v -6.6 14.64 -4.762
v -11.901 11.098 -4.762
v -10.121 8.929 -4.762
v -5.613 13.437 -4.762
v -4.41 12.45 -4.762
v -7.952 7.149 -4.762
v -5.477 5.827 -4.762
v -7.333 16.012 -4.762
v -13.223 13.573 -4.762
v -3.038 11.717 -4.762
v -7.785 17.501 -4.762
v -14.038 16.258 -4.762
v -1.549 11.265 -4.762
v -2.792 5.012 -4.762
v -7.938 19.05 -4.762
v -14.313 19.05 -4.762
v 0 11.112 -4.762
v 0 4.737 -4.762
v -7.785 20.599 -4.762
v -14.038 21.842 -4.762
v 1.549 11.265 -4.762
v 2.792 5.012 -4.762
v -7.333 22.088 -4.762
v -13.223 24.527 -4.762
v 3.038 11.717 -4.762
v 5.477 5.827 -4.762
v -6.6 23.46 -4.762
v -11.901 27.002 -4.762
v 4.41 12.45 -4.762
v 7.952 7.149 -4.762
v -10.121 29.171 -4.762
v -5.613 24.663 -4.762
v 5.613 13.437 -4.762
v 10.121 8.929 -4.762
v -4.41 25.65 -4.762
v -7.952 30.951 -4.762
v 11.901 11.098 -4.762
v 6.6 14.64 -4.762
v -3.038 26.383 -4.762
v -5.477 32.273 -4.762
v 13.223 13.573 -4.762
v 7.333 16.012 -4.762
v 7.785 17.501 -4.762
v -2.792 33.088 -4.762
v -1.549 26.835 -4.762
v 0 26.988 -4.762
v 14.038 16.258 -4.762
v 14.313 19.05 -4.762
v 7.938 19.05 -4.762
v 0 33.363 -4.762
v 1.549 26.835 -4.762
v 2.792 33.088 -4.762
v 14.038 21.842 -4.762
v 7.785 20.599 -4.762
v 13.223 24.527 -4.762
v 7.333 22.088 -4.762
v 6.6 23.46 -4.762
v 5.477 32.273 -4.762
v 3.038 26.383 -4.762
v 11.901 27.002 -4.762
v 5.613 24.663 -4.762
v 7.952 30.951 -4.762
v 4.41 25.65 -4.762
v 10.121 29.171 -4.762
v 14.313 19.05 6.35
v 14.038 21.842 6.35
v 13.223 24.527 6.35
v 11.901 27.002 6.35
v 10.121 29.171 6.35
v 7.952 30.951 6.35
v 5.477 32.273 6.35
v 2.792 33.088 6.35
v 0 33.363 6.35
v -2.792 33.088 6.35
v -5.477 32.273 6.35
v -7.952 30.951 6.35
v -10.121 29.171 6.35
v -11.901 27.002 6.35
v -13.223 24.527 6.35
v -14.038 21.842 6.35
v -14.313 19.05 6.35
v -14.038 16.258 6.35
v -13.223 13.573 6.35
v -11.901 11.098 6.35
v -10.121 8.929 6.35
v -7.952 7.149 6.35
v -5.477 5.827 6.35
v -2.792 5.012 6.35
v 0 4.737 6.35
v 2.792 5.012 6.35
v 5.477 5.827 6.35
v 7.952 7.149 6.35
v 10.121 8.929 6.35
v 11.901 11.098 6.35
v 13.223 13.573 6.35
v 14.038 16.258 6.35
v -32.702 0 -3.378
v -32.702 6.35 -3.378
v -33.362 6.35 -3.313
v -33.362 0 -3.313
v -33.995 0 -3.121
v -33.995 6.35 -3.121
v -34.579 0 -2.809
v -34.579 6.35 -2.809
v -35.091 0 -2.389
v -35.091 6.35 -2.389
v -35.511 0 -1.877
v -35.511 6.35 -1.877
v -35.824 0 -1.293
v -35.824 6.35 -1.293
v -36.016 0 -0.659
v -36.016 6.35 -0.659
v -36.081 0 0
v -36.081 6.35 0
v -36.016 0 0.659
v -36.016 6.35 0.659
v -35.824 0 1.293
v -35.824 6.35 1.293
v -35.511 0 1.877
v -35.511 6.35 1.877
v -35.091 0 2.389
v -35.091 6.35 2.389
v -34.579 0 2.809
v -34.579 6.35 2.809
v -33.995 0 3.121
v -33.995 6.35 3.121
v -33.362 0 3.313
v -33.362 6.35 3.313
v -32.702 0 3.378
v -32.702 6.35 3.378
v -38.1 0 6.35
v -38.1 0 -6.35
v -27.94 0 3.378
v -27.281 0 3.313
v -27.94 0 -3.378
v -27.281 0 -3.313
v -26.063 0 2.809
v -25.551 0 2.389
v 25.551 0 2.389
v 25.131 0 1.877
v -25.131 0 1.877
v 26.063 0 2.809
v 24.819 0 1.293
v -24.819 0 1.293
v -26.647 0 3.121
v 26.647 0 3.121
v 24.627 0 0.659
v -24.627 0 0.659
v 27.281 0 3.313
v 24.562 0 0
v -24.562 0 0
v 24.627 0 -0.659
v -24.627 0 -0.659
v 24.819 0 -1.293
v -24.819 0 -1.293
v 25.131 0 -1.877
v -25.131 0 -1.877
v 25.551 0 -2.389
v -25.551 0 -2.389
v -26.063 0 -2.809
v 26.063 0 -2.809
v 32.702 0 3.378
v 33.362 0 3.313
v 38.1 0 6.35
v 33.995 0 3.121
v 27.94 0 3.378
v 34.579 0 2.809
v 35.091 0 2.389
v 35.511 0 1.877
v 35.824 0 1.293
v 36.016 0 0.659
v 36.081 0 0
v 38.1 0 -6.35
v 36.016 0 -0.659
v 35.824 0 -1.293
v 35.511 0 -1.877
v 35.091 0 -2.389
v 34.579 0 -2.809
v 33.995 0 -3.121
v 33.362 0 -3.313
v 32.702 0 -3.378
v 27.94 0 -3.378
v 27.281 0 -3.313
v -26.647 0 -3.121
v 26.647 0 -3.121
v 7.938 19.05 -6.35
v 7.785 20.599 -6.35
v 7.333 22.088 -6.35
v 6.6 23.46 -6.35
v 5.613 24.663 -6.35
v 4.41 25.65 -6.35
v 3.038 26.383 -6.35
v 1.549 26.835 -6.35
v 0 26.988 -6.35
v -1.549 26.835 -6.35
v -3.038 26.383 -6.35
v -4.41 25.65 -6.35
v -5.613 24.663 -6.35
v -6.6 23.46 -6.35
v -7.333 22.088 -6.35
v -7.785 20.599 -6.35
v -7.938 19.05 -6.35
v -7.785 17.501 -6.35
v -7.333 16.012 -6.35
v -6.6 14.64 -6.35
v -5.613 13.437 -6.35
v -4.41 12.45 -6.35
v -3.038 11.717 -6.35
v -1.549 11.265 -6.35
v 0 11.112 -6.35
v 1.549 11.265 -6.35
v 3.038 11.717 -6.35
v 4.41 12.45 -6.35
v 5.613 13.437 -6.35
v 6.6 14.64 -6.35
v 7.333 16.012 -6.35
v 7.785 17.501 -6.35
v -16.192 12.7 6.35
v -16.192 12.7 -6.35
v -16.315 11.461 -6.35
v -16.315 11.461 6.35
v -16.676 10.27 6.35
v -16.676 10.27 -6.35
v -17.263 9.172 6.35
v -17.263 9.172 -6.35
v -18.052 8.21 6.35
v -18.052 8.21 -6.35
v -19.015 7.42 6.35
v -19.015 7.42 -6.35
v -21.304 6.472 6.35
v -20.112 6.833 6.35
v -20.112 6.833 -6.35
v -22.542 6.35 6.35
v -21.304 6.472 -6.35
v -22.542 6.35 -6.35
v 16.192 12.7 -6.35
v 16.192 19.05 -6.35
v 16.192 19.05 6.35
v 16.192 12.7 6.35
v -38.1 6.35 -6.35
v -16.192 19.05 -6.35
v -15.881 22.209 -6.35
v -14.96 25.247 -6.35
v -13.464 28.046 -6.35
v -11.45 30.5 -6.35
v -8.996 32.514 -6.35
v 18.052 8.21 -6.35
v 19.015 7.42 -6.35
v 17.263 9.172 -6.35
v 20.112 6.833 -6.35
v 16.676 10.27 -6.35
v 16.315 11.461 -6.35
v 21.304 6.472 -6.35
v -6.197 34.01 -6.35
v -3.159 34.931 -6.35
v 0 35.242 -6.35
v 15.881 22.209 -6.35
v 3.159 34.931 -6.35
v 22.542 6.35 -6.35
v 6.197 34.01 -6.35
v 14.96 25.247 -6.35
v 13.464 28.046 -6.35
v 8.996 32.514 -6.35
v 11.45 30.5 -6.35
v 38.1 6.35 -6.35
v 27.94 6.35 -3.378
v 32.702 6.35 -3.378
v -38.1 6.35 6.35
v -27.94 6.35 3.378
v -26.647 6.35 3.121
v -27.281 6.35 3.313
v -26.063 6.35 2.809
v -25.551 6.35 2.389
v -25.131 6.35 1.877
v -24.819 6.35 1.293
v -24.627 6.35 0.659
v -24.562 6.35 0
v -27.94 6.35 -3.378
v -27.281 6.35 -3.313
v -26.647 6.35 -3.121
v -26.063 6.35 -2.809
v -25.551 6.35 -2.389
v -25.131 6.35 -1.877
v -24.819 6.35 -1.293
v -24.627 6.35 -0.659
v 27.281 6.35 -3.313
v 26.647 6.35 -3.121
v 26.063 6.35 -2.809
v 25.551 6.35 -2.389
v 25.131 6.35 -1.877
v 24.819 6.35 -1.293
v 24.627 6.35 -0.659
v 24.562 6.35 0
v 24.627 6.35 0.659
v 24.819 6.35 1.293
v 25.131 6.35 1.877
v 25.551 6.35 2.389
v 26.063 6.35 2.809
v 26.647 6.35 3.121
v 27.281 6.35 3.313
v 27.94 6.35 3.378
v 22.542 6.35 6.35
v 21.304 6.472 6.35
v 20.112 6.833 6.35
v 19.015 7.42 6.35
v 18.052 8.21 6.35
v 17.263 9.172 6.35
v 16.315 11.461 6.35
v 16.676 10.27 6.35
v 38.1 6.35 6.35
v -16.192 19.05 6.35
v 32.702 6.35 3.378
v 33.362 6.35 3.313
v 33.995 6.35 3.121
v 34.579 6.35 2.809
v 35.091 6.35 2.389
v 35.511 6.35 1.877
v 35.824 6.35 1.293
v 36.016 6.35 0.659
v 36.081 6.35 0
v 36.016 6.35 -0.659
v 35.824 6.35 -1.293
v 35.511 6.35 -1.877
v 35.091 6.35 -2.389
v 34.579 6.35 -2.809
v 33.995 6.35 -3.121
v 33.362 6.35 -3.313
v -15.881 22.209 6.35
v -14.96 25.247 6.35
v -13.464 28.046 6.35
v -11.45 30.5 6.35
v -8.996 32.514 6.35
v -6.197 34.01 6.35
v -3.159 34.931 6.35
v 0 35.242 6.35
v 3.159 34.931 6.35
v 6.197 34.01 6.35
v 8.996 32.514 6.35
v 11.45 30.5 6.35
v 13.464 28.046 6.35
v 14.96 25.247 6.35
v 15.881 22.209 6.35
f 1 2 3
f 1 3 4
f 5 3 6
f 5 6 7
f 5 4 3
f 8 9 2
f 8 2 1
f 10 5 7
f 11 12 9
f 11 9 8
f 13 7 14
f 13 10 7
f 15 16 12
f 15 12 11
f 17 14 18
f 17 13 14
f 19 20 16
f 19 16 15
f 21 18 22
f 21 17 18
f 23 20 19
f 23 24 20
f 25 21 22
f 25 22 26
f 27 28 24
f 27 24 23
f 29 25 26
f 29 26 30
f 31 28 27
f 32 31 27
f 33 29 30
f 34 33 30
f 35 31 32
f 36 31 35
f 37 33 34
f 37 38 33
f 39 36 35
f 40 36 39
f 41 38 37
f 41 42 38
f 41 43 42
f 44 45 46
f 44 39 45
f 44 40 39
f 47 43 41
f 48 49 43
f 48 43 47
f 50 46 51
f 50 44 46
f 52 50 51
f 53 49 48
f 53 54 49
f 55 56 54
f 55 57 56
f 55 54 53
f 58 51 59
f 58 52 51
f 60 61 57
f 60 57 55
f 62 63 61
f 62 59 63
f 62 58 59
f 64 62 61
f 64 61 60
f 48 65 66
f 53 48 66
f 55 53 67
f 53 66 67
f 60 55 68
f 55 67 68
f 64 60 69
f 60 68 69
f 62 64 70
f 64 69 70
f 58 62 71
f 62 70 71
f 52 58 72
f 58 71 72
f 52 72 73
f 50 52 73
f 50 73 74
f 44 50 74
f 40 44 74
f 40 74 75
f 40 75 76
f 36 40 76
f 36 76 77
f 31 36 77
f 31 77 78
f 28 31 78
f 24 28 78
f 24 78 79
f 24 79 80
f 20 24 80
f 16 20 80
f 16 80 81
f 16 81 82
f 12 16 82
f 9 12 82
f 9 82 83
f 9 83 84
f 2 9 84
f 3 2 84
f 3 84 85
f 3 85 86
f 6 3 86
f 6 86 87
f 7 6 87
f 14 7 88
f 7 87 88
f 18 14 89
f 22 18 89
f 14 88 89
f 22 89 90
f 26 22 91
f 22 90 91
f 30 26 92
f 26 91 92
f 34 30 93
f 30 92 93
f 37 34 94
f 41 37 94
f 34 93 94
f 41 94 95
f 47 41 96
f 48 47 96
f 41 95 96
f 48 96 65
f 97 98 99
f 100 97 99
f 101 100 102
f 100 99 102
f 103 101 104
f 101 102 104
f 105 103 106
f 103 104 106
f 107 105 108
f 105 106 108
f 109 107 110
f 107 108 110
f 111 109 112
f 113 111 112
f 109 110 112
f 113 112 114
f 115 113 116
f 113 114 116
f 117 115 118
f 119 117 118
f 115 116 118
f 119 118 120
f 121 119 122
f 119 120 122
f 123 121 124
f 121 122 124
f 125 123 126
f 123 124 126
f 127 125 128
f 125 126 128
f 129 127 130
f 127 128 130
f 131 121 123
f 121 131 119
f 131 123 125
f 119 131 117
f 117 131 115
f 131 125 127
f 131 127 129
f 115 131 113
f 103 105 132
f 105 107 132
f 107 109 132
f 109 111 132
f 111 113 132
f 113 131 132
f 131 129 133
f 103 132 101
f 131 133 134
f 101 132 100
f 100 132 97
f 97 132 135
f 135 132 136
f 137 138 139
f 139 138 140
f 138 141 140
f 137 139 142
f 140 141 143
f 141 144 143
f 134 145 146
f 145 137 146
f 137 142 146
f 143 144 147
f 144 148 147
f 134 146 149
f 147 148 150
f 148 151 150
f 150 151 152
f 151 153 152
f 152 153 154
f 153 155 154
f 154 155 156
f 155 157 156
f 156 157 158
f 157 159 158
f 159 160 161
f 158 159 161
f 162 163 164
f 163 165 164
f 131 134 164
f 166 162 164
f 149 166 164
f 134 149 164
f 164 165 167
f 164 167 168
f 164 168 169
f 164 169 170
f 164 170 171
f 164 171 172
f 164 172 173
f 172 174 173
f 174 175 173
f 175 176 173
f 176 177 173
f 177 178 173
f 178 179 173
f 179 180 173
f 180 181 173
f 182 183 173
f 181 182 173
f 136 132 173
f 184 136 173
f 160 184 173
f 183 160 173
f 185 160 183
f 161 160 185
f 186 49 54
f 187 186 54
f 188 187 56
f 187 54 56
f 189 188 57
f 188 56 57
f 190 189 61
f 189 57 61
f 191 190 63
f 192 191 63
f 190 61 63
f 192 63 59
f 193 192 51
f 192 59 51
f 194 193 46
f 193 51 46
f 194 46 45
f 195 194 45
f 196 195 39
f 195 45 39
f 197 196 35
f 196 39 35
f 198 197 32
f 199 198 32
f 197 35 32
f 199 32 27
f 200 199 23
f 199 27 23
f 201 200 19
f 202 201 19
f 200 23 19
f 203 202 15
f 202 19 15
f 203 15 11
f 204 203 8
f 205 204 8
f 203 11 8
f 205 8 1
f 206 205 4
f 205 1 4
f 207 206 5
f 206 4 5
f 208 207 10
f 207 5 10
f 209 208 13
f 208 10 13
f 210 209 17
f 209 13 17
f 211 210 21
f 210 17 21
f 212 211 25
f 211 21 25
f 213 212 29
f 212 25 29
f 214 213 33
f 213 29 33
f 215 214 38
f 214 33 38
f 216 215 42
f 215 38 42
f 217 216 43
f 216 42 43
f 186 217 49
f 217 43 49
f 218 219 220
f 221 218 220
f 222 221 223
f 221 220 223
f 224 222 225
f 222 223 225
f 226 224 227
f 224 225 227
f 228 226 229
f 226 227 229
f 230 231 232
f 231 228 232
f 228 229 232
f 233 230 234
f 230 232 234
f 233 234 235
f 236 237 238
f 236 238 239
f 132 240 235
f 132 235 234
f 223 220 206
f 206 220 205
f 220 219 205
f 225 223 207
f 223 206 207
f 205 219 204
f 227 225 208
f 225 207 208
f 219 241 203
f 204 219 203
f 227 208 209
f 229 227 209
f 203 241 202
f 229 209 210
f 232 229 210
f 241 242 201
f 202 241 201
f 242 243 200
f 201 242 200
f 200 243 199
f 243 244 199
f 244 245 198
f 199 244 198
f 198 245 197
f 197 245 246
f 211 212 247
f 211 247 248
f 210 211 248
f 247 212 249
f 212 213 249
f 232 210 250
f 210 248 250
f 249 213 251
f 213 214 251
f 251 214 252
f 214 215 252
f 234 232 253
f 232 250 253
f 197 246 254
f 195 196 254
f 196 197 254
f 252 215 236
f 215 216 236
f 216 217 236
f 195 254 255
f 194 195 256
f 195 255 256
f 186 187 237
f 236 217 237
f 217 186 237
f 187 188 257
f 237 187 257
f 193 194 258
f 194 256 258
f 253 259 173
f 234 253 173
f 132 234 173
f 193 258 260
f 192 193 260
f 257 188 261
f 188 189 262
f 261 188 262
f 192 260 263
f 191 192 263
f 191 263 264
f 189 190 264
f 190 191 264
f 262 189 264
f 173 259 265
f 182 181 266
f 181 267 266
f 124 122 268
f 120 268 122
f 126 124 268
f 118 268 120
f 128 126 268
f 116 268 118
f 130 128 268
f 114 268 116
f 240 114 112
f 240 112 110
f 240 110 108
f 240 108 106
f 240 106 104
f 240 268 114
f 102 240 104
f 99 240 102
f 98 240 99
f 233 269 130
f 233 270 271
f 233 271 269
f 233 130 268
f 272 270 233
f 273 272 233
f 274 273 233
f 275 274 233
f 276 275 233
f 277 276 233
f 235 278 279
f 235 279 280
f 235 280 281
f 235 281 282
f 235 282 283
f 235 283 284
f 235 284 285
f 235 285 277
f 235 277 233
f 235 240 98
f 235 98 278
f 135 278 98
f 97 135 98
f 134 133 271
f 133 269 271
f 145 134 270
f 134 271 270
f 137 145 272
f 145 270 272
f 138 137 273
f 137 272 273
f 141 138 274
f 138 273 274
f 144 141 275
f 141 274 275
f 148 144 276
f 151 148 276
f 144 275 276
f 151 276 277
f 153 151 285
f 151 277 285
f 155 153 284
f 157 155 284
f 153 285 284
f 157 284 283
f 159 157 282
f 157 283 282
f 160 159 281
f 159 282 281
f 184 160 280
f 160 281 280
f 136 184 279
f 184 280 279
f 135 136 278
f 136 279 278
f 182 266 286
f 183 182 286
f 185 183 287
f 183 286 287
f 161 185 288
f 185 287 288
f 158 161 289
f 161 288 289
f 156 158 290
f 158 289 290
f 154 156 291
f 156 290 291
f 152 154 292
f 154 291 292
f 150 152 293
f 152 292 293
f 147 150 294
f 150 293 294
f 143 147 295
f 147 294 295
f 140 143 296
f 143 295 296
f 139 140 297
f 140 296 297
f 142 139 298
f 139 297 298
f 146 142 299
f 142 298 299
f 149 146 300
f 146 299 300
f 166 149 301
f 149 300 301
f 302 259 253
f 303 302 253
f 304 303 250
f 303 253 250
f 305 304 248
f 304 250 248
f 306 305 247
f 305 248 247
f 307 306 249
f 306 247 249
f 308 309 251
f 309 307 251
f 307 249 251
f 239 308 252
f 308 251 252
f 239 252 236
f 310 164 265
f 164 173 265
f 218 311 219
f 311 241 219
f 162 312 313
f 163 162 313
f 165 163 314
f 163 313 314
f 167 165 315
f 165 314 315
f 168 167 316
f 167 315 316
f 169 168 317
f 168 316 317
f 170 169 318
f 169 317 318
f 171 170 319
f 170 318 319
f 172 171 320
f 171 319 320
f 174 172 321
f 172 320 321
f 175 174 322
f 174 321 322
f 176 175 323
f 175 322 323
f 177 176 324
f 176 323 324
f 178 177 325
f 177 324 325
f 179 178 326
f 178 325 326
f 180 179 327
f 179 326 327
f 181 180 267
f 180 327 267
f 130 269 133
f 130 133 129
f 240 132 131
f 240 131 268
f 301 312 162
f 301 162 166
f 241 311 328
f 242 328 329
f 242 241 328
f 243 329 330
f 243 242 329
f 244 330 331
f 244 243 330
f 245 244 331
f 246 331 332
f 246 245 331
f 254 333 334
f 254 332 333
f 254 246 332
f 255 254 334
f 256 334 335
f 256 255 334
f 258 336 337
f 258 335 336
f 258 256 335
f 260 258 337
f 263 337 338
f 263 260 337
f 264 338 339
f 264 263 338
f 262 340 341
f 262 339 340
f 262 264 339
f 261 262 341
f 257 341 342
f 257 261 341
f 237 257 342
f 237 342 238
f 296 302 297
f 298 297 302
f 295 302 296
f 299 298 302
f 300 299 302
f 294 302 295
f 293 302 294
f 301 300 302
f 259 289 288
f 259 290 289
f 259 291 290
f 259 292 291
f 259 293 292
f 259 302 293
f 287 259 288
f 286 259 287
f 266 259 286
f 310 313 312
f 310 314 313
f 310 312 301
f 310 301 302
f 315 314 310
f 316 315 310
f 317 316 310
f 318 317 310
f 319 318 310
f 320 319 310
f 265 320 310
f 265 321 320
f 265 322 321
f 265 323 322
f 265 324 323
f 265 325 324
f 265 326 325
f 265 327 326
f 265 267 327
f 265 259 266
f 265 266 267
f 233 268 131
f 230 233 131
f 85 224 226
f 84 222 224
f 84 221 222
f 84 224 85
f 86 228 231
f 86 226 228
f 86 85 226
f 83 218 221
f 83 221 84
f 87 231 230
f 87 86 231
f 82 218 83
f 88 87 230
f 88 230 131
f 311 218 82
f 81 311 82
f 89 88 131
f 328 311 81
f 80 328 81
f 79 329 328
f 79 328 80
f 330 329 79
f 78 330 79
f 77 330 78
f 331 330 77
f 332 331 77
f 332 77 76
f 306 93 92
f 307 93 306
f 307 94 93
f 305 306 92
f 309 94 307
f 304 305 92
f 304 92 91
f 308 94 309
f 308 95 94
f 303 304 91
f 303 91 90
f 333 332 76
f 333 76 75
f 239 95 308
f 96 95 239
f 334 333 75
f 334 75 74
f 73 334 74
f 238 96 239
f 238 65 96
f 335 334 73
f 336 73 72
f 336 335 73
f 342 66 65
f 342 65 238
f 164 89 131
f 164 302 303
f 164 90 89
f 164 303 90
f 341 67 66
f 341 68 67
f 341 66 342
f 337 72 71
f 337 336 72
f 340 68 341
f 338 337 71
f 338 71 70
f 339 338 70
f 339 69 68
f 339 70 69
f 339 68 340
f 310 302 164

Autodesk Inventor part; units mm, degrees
ref_plane "YZ Plane" through (0, 0, 0) normal (1, 0, 0) x (0, 1, 0)
ref_plane "XZ Plane" through (0, 0, 0) normal (0, 1, 0) x (-1, 0, 0)
ref_plane "XY Plane" through (0, 0, 0) normal (0, 0, 1) x (1, 0, 0)
sketch "Sketch1" plane through (0, 0, 0) normal (0, 0, 1) x (1, 0, 0)
  line L0 (-53.34, 0) -> (53.34, 0) projected
  line L1 (0, -7.0485) -> (0, 42.291) projected
  line L2 (-38.1, 0) -> (38.1, 0)
  arc A0 (16.1925, 19.05) -> (-16.1925, 19.05) centre (0, 19.05) ccw
  line L3 (-38.1, 6.35) -> (-22.5425, 6.35)
  line L4 (22.5425, 6.35) -> (38.1, 6.35)
  line L5 (38.1, 0) -> (38.1, 6.35)
  line L6 (-38.1, 0) -> (-38.1, 6.35)
  line L7 (-16.1925, 19.05) -> (-16.1925, 12.7)
  line L8 (16.1925, 19.05) -> (16.1925, 12.7)
  arc A1 (-22.5425, 6.35) -> (-16.1925, 12.7) centre (-22.5425, 12.7) ccw
  arc A2 (16.1925, 12.7) -> (22.5425, 6.35) centre (22.5425, 12.7) ccw
  point P0 (0, 0)
  point P1 (-10.0453, 6.35)
  point P2 (10.0453, 6.35)
  dimension "d0" = 76.2
  dimension "d1" = 32.385
  dimension "d4" = 6.35
  dimension "d5" = 19.05
  dimension "d6" = 6.35
extrude "Extrusion1" add sketch "Sketch1" along normal mid plane 12.7
sketch "Sketch2" plane through (0, 0, 6.35) normal (0, 0, 1) x (1, 0, 0)
  arc A0 (16.1925, 19.05) -> (-16.1925, 19.05) centre (0, 19.05) ccw projected
  circle A1 centre (0, 19.05) radius 14.3129
  point P0 (0, 0)
  dimension "d9" = 28.6258
extrude "Extrusion2" cut sketch "Sketch2" against normal blind 11.1125
sketch "Sketch3" plane through (0, 19.05, -4.7625) normal (0, 0, 1) x (1, 0, 0)
  circle A0 centre (0, 0) radius 14.3129 projected
  circle A1 centre (0, 0) radius 7.9375
  point P0 (0, -19.05)
  dimension "d14" = 15.875
extrude "Extrusion3" cut sketch "Sketch3" against normal through all contours A1
sketch "Sketch4" plane through (-38.1, 6.35, 6.35) normal (0, 1, 0) x (1, 0, 0)
  line L0 (15.5575, 12.7) -> (0, 12.7) projected
  arc A0 (5.3975, 9.7282) -> (5.3975, 2.9718) centre (5.3975, 6.35) ccw
  line L1 (-15.24, 6.35) -> (91.44, 6.35) projected
  line L2 (38.1, 15.24) -> (38.1, -2.54) projected
  arc A1 (10.16, 2.9718) -> (10.16, 9.7282) centre (10.16, 6.35) ccw
  line L3 (10.16, 9.7282) -> (5.3975, 9.7282)
  line L4 (10.16, 2.9718) -> (5.3975, 2.9718)
  line L5 (7.7788, 2.9718) -> (7.7788, 9.7282) construction
  point P0 (38.1, 6.35)
  point P1 (7.7788, 12.7)
  dimension "d16" = 3.3782
  dimension "d17" = 4.7625
extrude "Mount Slot" cut sketch "Sketch4" against normal through all
mirror "Mirror1" about plane through (0, 0, 0) normal (1, 0, 0) of "Mount Slot"
properties part number "side mount bearing block"
